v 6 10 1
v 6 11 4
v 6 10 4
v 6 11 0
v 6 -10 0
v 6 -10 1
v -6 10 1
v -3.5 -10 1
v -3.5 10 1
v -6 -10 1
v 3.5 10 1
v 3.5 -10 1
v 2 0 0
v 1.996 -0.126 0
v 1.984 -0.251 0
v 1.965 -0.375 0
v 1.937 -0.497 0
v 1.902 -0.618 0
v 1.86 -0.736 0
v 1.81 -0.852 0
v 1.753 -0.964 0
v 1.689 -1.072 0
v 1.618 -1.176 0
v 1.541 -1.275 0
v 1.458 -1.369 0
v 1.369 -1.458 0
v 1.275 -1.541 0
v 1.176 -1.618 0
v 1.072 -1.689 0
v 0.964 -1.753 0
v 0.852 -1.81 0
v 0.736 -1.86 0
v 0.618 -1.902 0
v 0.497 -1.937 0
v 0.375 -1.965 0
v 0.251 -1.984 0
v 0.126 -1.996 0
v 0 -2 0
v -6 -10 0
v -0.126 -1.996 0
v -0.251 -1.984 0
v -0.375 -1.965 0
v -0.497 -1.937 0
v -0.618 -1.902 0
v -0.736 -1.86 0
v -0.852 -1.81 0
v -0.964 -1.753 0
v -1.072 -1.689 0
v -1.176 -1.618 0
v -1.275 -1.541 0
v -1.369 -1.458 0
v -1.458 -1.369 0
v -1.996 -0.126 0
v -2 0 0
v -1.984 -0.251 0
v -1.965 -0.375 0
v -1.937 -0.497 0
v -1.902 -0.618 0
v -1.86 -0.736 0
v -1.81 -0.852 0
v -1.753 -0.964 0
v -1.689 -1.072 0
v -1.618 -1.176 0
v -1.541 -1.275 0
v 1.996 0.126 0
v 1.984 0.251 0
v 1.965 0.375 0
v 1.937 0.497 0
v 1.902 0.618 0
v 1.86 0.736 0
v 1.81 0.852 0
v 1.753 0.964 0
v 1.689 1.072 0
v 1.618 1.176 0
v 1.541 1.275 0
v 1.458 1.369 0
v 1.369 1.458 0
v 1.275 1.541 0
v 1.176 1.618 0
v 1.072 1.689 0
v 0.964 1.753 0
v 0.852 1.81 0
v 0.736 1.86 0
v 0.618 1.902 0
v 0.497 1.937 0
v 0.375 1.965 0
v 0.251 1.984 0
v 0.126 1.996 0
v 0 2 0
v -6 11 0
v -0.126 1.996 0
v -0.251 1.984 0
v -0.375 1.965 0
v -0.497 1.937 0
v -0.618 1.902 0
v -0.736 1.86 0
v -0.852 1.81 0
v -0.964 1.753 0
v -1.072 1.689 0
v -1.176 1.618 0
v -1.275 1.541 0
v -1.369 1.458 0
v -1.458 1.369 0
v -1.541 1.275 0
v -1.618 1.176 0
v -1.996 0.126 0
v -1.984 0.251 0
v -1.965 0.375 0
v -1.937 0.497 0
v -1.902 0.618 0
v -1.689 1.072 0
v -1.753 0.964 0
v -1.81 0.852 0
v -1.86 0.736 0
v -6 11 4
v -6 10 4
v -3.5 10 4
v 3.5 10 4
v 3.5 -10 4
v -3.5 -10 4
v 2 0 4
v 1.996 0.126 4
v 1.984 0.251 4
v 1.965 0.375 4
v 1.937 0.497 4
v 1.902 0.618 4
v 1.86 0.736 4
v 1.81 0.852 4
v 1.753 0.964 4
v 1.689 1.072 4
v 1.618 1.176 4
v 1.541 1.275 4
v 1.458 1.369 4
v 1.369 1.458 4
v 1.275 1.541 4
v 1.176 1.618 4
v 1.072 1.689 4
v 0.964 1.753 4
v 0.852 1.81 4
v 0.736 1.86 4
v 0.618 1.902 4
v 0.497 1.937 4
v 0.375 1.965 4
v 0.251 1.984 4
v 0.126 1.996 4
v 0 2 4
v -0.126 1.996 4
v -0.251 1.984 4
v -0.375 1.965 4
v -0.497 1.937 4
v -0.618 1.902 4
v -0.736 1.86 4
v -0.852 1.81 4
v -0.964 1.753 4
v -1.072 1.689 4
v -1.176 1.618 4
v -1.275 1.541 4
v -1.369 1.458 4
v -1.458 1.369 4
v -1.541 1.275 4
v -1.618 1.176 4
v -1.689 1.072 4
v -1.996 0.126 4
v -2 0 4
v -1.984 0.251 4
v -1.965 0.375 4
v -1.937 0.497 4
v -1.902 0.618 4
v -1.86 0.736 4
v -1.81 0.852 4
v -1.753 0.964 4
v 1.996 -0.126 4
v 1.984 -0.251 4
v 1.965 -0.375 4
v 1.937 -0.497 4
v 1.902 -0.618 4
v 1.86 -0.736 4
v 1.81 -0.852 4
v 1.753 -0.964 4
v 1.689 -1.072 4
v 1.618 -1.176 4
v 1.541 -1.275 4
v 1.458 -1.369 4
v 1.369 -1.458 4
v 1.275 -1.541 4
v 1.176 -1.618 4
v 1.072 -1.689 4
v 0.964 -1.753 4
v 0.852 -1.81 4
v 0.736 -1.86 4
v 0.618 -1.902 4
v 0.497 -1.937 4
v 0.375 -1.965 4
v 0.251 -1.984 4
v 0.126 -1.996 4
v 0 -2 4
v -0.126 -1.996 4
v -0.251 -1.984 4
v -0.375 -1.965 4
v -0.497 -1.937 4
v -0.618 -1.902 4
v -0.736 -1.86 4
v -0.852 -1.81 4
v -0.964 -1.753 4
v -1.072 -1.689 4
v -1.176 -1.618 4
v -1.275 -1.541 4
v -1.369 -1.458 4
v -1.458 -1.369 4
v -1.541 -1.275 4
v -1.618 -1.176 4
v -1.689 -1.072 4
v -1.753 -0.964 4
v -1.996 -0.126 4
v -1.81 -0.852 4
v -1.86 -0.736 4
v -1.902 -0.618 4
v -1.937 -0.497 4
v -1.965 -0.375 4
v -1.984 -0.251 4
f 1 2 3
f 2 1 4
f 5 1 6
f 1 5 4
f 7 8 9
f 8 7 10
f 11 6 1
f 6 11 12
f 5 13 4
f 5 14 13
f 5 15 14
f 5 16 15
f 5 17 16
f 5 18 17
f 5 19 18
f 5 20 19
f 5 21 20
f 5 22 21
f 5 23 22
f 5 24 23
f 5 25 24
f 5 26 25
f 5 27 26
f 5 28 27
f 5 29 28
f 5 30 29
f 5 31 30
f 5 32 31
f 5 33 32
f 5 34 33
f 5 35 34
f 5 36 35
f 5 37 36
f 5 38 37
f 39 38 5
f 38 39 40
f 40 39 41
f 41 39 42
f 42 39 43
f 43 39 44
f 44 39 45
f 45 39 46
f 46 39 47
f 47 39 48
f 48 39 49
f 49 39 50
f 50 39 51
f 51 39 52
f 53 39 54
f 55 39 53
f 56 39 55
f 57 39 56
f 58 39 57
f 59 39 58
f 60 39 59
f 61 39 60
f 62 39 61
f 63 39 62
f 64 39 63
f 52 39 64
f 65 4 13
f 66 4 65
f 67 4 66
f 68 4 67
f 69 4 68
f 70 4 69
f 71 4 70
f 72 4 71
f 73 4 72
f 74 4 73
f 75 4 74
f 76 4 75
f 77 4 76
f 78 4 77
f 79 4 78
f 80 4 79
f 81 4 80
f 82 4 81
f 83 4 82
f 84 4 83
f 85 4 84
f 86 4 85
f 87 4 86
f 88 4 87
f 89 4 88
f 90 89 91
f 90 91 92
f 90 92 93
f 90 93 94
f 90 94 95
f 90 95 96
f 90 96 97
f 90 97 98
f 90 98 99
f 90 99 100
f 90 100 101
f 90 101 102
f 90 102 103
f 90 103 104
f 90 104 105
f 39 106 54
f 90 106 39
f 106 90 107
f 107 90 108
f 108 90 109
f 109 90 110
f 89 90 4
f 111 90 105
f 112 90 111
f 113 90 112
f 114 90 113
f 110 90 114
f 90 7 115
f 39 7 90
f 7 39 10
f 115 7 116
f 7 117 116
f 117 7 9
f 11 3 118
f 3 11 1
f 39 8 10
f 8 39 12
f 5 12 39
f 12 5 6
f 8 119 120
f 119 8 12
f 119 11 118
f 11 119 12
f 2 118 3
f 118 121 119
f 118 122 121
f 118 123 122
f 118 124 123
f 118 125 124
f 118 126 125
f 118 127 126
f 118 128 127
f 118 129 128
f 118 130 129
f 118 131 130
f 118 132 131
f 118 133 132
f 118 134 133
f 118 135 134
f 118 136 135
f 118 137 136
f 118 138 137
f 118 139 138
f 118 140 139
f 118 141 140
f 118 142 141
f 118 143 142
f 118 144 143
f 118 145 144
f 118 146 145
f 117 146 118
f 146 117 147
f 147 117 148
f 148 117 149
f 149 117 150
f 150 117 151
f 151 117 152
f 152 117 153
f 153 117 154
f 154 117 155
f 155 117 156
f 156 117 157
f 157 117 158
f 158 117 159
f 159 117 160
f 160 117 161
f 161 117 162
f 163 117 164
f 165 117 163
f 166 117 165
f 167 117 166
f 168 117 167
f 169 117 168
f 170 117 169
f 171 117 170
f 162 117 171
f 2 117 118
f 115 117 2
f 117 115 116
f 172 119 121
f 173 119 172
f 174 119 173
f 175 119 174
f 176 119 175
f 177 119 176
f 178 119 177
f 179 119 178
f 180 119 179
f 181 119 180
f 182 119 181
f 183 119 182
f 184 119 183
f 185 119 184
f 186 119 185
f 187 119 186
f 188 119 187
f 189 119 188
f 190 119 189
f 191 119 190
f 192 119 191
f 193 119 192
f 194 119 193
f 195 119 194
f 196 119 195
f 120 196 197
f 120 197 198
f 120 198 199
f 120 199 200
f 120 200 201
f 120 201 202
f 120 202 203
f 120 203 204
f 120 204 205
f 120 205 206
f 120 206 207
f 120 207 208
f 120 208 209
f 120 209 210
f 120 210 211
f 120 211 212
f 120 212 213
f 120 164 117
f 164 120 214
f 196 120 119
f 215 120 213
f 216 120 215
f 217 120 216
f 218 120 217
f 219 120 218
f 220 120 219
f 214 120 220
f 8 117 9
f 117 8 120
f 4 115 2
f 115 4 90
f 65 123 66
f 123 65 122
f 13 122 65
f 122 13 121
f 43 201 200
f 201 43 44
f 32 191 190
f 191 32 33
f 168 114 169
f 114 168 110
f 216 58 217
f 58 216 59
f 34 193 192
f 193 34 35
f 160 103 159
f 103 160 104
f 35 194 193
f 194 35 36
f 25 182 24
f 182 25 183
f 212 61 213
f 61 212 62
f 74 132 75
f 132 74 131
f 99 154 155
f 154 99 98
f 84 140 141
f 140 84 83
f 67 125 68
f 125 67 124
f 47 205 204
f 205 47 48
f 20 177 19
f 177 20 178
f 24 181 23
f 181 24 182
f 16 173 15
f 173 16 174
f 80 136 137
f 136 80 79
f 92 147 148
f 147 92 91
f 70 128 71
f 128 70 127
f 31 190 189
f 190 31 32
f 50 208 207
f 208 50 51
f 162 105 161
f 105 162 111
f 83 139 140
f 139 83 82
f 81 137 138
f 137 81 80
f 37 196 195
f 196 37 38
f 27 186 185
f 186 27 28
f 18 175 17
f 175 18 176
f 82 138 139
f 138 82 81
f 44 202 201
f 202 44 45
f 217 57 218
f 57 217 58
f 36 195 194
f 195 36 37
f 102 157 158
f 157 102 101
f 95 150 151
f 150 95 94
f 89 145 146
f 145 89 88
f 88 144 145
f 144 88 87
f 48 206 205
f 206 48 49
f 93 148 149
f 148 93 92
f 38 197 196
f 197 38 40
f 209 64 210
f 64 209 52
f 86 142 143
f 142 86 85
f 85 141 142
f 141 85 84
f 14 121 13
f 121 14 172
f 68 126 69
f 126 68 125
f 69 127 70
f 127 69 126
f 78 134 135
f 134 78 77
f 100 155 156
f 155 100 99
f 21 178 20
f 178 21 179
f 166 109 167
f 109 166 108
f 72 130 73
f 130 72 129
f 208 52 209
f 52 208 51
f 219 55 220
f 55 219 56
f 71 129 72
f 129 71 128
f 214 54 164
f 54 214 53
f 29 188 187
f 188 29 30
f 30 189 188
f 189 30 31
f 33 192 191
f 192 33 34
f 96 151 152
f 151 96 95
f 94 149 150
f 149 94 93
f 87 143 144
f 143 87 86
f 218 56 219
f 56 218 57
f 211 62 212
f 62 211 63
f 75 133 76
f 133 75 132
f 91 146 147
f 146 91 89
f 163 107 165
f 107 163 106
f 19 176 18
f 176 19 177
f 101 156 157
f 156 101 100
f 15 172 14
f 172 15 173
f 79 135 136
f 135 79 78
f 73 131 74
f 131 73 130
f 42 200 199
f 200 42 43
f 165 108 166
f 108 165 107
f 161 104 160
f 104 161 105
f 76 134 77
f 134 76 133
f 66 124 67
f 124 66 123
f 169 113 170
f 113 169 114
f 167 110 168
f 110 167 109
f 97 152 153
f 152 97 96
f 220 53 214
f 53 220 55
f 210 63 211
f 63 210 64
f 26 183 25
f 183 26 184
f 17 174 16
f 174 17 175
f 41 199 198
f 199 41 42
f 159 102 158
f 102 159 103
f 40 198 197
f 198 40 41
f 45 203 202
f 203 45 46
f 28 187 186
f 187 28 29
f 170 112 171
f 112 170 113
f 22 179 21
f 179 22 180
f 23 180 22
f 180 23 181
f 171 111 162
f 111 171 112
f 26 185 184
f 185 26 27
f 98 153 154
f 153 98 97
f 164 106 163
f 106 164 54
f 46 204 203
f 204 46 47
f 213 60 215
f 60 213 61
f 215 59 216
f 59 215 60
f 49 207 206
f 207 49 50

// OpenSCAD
$fn=100;


difference() {
	union() {
		translate([0, 0, 0.5])  cube([12, 20, 1], true);
		translate([0, 0, 2]) cube([7, 20, 4], true);
		translate([0, 10.5, 2])  cube([12, 1, 4], true);
	}
	cylinder(h = 10, d = 4, center=true);
}
